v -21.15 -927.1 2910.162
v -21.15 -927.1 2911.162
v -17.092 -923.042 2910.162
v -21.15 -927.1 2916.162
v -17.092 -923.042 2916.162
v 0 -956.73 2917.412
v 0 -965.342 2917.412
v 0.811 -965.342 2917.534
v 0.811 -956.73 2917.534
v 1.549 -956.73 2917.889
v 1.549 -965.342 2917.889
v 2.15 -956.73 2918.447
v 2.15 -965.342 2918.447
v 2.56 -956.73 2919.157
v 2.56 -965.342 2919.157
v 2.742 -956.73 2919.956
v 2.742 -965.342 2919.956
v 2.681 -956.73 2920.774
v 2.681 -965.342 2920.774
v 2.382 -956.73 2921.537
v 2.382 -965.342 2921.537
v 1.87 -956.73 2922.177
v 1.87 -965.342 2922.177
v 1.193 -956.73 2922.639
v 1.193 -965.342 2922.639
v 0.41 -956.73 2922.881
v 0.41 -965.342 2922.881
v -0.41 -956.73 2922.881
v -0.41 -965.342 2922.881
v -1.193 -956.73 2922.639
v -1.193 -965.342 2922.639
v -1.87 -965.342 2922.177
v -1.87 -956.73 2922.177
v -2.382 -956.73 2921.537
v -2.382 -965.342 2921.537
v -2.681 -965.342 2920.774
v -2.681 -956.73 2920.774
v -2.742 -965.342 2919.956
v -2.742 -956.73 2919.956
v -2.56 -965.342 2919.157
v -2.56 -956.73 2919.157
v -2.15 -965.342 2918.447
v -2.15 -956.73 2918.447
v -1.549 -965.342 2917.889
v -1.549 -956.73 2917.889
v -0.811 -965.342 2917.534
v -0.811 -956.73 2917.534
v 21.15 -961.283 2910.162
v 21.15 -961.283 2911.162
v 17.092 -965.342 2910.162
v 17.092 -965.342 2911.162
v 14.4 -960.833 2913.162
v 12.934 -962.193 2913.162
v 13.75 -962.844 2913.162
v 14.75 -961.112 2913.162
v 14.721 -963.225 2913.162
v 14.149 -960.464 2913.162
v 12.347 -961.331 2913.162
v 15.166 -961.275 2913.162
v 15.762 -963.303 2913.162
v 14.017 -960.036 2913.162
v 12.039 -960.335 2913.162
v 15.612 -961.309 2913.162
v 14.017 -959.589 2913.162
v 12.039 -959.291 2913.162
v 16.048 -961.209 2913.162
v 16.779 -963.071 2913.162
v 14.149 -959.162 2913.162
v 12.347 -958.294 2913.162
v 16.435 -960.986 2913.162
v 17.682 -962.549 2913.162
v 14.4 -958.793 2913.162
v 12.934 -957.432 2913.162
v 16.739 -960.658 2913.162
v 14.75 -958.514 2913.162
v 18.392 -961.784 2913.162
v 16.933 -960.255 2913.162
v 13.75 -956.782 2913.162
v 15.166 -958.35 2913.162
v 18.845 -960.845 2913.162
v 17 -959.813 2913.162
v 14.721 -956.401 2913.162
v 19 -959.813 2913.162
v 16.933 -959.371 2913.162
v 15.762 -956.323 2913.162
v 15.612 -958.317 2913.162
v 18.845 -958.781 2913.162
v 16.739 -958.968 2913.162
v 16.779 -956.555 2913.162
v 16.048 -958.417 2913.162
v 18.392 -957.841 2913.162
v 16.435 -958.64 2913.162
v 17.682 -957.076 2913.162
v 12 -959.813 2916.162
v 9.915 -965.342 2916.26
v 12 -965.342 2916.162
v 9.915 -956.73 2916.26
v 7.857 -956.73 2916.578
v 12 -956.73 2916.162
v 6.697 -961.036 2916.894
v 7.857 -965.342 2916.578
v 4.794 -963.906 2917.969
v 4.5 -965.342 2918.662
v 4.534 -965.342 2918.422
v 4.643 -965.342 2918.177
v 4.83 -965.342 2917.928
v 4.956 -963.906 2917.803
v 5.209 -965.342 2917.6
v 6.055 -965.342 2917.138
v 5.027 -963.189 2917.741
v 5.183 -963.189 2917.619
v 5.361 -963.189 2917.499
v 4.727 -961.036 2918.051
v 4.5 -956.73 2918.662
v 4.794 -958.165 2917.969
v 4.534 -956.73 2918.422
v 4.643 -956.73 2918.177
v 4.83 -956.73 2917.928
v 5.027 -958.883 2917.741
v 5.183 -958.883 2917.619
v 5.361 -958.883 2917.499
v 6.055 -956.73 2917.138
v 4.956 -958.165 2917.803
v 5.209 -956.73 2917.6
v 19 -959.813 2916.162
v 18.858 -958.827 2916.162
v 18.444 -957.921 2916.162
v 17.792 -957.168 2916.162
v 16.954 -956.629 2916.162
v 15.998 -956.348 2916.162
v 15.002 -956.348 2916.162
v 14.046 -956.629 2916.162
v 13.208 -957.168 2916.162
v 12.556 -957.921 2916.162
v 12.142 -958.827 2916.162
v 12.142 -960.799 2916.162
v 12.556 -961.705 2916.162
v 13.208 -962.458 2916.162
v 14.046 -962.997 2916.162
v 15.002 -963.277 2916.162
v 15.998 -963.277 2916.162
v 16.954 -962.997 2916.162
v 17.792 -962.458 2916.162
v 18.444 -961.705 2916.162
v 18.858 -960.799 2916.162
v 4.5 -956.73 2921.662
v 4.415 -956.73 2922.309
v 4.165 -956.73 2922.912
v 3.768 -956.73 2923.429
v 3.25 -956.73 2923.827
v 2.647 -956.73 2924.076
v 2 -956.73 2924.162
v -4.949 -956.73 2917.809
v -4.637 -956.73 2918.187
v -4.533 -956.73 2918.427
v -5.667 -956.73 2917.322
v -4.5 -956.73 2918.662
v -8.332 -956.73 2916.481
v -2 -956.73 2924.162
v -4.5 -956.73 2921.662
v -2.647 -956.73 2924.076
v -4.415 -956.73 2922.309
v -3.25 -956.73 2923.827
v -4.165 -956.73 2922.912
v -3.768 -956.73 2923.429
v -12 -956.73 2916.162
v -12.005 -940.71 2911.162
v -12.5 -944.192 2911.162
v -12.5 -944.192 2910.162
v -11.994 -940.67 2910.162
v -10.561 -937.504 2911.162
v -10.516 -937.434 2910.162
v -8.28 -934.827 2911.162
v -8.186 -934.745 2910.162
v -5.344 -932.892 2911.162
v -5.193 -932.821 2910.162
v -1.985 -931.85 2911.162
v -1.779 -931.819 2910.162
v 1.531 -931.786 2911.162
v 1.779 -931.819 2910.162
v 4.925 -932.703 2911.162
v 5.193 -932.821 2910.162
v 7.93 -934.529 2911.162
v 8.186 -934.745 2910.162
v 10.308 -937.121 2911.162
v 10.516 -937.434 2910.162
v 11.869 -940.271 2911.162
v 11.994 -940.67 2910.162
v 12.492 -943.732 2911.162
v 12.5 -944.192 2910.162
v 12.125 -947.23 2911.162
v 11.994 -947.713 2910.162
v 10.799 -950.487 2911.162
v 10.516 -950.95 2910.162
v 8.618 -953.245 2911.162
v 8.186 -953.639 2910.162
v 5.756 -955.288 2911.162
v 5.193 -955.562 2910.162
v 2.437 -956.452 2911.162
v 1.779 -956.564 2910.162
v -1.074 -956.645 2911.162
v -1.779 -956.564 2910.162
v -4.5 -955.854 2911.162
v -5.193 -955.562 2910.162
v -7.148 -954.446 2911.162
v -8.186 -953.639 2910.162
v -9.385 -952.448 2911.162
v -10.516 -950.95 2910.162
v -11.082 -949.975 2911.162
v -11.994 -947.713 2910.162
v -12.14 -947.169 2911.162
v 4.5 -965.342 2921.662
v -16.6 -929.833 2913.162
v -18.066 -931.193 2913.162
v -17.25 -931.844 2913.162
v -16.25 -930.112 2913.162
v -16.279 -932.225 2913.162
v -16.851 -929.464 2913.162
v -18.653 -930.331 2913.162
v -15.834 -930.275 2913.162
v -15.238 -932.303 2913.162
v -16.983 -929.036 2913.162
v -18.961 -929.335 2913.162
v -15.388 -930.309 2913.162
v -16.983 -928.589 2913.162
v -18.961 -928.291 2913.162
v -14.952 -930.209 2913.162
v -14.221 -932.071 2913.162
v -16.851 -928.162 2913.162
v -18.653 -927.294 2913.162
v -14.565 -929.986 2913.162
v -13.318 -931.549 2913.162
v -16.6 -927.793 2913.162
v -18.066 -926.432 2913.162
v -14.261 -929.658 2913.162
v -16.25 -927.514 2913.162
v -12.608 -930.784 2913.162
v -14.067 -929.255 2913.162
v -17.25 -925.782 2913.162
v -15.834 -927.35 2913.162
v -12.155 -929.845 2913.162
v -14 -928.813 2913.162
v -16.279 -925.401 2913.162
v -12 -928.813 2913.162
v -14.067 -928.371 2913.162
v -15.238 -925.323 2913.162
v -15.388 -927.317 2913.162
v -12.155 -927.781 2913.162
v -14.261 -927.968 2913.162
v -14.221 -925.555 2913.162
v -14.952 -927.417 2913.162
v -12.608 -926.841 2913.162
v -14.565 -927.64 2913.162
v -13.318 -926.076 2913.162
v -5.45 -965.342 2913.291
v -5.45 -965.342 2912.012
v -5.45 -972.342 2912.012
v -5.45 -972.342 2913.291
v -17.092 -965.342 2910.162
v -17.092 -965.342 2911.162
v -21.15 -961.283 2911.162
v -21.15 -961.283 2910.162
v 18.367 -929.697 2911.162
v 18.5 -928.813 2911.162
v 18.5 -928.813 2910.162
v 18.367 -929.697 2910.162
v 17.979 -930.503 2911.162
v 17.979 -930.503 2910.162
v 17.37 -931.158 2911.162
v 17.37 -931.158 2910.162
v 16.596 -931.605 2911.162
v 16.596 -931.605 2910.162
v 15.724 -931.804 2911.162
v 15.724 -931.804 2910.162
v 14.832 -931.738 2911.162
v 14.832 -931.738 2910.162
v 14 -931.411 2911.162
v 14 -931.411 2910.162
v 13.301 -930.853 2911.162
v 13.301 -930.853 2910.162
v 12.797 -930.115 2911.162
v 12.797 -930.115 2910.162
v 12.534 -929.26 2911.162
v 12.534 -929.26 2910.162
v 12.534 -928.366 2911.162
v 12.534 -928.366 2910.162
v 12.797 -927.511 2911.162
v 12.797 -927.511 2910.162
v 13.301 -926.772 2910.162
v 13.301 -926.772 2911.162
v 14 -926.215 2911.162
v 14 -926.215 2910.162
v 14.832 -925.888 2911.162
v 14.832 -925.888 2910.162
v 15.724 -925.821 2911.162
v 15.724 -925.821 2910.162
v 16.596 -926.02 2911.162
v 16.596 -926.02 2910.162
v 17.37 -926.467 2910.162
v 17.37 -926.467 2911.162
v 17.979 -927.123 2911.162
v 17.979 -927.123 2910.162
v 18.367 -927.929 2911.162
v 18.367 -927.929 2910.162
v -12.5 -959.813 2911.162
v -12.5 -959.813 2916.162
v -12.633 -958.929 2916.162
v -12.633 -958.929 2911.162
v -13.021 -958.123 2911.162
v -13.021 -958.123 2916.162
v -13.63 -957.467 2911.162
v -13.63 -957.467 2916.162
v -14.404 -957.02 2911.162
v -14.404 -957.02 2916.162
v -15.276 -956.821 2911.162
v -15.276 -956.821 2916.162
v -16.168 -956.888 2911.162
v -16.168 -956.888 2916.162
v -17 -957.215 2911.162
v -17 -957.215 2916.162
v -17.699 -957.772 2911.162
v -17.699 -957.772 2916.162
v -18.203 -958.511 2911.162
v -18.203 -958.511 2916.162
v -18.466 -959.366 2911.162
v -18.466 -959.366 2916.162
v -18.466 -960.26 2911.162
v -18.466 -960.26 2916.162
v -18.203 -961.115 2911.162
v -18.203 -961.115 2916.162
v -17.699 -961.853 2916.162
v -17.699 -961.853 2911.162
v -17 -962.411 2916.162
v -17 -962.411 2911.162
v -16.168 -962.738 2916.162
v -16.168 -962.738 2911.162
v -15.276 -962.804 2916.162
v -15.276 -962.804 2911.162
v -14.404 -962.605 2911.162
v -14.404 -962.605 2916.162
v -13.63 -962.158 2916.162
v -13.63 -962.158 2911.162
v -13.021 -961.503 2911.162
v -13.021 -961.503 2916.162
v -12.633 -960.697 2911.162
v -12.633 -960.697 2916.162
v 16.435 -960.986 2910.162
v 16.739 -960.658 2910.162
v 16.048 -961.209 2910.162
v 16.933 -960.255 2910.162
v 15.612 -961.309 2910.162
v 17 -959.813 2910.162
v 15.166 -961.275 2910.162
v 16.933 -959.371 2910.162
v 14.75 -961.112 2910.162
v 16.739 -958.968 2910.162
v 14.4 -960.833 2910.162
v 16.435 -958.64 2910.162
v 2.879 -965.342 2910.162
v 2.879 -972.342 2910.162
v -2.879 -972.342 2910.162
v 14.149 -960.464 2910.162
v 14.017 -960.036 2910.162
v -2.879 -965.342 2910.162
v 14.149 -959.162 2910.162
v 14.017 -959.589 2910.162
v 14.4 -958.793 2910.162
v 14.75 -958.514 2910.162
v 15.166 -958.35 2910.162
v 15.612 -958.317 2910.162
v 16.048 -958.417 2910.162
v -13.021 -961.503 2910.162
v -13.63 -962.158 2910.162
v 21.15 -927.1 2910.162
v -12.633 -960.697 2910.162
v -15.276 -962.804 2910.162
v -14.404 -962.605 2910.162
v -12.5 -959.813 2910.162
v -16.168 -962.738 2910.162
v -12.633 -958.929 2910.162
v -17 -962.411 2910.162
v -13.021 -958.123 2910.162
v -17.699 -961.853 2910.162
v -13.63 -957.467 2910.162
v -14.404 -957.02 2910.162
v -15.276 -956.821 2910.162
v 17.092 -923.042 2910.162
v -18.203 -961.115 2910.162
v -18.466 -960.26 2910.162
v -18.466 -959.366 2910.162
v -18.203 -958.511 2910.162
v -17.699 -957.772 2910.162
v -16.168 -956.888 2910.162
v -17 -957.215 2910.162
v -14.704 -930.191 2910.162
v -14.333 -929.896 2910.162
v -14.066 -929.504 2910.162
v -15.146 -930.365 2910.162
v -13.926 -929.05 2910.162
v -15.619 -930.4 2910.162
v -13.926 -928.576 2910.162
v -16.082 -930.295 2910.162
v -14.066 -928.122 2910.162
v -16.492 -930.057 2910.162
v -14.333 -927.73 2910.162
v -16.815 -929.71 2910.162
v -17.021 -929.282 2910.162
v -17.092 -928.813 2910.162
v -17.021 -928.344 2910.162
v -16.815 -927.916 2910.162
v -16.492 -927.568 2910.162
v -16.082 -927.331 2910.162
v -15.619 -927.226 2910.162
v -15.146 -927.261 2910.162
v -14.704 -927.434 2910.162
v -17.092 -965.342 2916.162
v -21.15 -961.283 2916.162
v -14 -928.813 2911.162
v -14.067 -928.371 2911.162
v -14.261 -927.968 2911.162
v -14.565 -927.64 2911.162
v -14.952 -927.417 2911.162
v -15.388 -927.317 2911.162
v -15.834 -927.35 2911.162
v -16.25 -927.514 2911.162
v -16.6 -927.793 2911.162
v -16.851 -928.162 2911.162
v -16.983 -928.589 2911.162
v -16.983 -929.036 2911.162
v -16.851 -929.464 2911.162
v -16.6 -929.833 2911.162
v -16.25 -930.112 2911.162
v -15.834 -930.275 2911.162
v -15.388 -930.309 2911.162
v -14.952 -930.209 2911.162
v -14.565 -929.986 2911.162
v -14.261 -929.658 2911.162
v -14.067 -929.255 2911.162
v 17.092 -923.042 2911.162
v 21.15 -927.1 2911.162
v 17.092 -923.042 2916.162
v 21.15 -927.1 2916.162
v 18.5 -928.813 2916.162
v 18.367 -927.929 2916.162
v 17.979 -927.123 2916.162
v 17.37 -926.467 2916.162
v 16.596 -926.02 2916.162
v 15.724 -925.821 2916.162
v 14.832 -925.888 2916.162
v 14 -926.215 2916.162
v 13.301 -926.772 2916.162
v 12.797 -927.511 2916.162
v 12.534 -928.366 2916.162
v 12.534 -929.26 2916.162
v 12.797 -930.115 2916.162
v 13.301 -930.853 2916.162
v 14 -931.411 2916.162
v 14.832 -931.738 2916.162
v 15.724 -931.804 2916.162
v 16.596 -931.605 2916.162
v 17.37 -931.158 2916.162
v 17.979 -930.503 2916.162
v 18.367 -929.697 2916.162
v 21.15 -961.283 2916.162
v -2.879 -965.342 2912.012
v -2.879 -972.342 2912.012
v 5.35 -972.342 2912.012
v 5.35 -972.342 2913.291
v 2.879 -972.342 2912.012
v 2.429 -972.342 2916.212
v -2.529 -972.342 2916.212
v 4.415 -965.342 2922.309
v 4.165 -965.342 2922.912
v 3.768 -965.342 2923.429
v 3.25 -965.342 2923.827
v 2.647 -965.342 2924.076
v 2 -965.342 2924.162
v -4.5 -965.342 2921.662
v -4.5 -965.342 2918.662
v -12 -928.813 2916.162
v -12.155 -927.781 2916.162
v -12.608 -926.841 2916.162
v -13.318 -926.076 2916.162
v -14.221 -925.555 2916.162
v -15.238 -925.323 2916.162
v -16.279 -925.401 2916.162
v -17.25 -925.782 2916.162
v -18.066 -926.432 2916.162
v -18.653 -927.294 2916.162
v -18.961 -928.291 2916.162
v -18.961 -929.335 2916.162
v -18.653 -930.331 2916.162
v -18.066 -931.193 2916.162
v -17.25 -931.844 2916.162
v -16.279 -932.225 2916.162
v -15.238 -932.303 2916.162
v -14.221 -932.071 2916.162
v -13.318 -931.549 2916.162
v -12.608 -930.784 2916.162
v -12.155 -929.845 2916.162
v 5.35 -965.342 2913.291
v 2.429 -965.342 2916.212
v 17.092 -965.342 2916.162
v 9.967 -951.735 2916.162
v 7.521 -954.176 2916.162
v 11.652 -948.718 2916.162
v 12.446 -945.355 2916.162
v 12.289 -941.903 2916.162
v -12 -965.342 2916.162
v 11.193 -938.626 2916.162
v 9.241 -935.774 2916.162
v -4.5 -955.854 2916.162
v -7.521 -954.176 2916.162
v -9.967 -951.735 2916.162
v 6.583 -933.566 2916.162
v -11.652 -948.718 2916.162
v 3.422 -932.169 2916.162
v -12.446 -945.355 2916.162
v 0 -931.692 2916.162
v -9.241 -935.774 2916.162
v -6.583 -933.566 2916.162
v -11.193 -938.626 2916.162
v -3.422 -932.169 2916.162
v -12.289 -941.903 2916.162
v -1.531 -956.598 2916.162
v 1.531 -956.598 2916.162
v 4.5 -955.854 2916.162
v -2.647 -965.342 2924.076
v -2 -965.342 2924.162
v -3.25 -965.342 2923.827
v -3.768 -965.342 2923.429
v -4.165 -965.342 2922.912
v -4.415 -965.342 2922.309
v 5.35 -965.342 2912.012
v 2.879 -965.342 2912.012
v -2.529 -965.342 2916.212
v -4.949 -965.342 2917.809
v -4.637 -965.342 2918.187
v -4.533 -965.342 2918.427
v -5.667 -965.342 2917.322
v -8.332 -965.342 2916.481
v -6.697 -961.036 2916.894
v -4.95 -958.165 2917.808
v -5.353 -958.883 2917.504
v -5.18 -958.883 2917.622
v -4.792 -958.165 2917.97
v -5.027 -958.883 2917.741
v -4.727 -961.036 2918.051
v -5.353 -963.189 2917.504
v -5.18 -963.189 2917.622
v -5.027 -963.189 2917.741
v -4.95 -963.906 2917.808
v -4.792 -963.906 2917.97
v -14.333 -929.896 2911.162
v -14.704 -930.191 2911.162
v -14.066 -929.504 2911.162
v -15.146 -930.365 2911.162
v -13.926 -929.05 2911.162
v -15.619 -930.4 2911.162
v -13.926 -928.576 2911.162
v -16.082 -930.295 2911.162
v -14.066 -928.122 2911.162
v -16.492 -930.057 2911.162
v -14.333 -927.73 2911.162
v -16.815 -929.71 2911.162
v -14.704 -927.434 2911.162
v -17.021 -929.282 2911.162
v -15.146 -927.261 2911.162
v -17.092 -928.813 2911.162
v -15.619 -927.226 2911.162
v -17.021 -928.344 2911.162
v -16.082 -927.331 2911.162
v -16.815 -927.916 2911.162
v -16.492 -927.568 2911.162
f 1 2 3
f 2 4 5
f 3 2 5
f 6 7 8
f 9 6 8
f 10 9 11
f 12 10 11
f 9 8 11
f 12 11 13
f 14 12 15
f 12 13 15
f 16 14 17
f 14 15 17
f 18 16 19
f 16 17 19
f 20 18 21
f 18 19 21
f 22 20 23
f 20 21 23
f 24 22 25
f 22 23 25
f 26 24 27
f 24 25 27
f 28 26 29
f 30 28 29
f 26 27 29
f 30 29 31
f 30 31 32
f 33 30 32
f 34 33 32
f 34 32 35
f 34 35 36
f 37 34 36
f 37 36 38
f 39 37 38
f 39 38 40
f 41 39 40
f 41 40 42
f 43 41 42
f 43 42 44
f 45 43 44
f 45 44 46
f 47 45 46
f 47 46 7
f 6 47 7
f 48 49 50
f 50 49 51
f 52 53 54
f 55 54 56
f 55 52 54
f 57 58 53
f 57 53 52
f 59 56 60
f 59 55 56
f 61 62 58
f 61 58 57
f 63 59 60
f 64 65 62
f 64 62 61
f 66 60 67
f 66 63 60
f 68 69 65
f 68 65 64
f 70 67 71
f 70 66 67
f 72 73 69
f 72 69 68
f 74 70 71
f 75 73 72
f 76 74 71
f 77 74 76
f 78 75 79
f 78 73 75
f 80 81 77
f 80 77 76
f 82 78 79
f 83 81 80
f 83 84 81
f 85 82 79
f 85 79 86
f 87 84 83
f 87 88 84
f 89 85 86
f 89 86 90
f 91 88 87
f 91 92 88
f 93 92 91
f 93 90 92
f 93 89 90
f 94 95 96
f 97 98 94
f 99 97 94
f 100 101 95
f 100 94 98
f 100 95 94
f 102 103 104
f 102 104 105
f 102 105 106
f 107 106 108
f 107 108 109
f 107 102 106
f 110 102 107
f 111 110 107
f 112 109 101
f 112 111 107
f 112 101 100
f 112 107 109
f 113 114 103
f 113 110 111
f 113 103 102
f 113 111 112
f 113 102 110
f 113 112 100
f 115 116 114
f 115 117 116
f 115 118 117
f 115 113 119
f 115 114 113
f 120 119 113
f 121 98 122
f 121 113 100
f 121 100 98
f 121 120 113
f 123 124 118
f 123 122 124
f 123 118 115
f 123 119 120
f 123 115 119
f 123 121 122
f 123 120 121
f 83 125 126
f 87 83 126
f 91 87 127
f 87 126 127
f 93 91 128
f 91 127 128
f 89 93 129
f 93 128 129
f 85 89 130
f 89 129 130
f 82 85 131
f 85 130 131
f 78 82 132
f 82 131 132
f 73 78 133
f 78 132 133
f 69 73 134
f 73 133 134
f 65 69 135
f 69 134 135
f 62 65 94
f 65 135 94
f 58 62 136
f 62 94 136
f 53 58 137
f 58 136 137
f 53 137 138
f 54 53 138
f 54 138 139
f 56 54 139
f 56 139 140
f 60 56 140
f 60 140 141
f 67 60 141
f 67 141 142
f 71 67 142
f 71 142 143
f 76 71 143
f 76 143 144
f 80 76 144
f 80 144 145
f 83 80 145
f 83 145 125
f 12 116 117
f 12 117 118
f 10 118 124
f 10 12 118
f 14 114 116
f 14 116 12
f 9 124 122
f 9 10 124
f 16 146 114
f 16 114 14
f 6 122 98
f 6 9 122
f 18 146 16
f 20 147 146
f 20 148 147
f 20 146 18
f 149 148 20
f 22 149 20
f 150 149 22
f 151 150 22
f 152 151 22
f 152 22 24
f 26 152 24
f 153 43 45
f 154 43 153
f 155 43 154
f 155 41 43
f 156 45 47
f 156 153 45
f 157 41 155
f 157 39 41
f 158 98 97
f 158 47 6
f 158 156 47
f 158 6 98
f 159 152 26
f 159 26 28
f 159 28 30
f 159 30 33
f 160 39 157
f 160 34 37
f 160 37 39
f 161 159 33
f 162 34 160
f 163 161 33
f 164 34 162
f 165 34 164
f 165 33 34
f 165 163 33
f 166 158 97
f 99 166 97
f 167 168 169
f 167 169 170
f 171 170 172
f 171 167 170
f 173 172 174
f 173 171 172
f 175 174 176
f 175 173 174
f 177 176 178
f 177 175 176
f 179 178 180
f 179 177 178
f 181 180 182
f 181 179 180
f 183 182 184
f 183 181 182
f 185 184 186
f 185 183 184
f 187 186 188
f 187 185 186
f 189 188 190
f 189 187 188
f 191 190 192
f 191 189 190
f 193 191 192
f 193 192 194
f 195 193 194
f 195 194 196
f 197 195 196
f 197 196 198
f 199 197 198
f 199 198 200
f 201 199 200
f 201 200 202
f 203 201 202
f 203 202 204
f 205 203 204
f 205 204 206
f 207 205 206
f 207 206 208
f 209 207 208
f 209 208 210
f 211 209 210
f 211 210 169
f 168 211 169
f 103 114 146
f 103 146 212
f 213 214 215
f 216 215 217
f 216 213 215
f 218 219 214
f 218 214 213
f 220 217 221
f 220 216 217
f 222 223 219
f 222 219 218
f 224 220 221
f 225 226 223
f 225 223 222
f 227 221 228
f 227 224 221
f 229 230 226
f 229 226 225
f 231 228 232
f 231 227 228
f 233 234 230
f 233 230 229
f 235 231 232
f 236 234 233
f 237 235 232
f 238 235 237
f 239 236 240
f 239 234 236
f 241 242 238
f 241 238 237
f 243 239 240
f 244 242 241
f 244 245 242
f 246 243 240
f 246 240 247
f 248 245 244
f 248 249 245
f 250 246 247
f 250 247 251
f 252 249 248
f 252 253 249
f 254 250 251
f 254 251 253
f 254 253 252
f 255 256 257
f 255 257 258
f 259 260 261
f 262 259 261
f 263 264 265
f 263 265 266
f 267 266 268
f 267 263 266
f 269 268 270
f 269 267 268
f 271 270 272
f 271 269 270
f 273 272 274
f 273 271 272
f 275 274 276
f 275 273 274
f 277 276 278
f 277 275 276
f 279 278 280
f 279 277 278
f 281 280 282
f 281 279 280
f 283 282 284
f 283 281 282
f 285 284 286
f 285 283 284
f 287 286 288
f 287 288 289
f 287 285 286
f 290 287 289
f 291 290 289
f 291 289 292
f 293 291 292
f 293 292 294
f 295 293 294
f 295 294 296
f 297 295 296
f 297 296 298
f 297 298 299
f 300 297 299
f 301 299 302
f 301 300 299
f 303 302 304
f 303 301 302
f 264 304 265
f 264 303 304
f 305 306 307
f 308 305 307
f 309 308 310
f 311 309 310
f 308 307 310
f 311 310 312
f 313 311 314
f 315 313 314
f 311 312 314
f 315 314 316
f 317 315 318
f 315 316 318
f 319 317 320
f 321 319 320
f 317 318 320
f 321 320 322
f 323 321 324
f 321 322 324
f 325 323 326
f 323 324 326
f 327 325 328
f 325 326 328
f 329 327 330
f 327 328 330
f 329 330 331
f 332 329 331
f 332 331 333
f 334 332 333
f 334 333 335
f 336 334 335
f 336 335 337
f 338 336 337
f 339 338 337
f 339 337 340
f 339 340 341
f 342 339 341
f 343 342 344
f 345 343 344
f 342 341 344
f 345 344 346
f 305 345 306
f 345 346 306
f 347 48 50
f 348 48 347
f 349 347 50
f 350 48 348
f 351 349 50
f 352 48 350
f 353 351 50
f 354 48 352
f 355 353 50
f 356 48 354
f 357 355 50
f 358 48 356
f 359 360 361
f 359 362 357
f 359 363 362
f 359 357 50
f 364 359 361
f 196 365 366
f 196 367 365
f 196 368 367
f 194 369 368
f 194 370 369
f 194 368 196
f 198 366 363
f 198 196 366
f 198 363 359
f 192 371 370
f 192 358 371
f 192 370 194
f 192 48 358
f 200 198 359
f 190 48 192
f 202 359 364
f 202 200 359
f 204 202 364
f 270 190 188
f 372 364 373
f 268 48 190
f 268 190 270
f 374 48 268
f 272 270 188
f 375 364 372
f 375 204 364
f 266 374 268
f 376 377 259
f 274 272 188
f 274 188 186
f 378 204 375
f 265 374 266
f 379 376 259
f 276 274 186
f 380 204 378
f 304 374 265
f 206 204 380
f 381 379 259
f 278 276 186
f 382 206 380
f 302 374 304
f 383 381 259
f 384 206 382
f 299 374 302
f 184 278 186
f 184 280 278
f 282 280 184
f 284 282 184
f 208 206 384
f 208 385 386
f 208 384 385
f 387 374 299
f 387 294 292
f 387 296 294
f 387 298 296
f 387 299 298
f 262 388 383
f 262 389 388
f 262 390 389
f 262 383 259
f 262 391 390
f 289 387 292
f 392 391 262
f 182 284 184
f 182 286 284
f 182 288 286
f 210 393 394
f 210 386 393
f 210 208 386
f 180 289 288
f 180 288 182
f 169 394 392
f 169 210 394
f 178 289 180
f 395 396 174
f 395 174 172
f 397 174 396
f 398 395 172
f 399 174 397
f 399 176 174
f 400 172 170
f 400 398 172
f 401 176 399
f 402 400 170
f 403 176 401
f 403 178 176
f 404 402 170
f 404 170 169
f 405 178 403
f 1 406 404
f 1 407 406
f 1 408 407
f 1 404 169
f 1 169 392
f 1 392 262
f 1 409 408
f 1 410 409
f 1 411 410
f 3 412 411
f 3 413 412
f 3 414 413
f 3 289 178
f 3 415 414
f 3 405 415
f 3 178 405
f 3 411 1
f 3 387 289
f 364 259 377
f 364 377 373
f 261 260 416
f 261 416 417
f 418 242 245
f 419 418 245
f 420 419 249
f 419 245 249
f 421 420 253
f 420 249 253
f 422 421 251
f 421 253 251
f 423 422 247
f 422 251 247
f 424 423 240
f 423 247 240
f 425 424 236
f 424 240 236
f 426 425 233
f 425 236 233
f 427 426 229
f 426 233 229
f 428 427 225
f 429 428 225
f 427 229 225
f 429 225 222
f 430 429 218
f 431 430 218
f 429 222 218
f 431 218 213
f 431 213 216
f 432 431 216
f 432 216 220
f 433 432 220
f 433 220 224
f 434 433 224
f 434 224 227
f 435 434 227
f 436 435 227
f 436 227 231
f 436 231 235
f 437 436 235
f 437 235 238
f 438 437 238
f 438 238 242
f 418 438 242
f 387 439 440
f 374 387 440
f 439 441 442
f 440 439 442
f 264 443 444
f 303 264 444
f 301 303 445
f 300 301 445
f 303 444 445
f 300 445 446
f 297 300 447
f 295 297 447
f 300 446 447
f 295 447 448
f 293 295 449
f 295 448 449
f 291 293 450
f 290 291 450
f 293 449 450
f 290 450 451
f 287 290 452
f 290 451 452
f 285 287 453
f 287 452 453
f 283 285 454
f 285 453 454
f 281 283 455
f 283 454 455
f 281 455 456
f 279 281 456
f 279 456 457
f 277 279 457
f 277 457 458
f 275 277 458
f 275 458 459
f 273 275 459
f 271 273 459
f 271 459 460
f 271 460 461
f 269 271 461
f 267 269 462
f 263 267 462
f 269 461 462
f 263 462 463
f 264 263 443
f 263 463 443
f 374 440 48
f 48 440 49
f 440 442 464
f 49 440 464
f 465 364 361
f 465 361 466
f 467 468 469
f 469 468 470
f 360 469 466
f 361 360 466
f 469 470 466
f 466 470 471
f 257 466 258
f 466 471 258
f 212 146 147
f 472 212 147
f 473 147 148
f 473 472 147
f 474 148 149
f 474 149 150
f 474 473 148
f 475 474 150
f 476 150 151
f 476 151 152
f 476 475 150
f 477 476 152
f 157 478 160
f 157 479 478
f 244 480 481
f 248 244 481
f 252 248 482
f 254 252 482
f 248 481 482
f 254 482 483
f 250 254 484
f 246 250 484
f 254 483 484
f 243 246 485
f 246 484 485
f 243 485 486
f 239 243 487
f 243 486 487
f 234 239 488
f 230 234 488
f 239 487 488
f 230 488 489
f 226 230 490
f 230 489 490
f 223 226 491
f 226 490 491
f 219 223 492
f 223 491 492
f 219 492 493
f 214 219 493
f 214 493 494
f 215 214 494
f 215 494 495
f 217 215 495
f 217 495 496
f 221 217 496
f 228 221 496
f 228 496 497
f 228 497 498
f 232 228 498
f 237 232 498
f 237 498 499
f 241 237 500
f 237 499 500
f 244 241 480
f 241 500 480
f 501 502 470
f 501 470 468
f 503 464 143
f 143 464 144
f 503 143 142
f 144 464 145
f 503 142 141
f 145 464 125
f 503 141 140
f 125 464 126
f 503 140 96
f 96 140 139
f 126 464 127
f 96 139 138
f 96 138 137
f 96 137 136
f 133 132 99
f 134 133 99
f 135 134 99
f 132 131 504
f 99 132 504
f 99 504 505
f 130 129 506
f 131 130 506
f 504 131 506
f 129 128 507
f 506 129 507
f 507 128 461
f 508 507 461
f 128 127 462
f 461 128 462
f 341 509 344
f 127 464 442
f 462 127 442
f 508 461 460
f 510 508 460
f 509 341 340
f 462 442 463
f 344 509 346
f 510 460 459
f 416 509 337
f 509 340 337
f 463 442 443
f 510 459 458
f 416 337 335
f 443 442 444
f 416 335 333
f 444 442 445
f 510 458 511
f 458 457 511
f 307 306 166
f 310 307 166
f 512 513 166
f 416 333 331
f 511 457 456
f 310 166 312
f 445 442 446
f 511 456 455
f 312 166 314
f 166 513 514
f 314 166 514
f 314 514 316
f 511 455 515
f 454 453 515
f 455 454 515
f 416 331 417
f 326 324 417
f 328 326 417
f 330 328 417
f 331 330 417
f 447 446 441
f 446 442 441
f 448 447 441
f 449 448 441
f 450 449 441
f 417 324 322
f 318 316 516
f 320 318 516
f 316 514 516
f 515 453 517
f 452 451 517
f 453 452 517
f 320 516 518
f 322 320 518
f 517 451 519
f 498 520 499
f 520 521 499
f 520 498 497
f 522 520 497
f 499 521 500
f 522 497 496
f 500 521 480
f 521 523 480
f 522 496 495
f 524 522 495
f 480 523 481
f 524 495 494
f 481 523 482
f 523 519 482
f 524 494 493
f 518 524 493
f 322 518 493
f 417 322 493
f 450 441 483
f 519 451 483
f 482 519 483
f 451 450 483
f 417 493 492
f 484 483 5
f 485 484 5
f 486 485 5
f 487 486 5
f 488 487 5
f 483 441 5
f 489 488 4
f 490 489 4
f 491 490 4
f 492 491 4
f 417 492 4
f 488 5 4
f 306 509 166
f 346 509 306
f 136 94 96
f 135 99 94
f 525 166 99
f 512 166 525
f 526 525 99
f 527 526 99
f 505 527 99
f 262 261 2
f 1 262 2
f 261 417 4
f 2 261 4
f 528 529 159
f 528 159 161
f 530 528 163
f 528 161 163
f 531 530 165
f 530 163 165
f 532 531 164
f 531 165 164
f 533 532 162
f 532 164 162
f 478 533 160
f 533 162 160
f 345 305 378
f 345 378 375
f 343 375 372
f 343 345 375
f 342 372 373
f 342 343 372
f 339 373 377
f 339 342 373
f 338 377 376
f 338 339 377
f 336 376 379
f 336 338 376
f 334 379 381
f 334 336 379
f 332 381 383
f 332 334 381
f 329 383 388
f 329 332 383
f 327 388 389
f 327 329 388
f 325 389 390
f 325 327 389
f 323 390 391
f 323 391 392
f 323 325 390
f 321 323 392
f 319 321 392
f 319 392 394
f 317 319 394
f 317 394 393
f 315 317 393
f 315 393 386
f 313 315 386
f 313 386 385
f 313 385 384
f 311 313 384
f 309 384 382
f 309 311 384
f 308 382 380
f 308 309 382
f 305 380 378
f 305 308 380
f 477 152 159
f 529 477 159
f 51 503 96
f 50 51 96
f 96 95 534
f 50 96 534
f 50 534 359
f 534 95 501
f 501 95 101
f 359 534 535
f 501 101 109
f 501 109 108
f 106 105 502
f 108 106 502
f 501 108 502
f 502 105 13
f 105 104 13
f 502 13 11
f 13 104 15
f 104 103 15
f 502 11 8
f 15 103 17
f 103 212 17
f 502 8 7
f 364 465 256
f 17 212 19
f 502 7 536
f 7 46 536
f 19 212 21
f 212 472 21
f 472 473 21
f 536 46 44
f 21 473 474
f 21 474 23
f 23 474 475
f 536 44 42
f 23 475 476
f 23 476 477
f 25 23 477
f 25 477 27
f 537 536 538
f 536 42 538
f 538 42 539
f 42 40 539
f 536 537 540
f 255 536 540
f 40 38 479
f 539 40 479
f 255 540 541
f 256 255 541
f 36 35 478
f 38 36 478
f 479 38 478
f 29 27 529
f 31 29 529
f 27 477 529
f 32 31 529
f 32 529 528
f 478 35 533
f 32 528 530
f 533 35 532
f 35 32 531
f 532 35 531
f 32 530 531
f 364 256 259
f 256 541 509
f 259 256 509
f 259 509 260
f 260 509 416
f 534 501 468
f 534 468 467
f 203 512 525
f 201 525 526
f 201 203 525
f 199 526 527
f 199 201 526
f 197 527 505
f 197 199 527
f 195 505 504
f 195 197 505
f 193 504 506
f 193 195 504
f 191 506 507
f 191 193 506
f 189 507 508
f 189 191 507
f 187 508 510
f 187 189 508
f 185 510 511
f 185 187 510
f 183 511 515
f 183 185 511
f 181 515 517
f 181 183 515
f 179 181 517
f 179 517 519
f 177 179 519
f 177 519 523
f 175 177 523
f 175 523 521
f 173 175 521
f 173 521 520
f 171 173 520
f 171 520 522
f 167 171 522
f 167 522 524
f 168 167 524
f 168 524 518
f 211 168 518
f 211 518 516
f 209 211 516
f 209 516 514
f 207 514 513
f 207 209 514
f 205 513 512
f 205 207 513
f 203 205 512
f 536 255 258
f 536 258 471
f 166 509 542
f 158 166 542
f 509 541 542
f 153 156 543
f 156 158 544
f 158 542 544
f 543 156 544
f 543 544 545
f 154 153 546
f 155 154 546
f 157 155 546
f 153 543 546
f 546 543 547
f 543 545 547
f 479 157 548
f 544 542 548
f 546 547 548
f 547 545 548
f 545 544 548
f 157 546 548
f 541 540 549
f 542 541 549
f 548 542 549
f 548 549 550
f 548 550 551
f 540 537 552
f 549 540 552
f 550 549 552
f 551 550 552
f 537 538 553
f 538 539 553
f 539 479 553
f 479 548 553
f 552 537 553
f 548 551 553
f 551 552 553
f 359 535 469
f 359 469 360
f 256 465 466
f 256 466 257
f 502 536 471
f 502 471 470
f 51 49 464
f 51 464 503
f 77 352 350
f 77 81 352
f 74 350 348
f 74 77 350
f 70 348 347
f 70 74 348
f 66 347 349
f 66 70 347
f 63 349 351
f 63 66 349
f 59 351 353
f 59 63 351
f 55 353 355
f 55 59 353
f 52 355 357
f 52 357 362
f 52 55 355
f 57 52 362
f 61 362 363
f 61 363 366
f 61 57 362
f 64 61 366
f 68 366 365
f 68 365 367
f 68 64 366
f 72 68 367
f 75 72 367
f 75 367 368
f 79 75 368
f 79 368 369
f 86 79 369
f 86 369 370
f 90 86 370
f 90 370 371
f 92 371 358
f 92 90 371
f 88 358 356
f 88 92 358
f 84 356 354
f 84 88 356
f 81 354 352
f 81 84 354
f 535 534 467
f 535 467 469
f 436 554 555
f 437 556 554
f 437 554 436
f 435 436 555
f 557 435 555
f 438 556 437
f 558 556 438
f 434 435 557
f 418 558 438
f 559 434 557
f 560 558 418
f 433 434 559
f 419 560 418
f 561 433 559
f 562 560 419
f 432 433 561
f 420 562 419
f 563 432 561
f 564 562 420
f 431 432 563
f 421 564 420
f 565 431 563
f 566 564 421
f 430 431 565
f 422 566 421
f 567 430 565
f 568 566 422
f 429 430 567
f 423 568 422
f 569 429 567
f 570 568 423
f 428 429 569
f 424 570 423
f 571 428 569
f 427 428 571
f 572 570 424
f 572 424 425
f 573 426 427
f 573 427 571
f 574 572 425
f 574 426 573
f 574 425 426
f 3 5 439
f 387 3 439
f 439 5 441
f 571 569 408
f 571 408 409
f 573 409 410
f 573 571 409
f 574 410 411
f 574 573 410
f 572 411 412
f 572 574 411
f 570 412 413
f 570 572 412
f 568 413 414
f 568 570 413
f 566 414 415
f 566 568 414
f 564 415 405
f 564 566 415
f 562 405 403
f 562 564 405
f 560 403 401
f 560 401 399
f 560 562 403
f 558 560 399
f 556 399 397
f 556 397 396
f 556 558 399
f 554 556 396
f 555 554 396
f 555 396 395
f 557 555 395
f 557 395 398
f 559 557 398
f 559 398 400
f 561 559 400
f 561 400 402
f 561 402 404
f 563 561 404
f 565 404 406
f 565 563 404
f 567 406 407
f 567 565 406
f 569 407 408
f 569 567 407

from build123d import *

# Parameters (mm, degrees)
SKETCH1_R                    = 11025
BOSS_EXTRUDE1_DEPTH          = 5000
BOSS_EXTRUDE2_DEPTH          = 8000
SKETCH4_R                    = 3000
CUT_EXTRUDE2_DEPTH           = 3000
SKETCH5_R                    = 1500
CUT_EXTRUDE3_DEPTH           = 3000
SKETCH6_R                    = 3000
CUT_EXTRUDE4_DEPTH           = 3000
SKETCH3_R                    = 2900
CUT_EXTRUDE1_DEPTH           = 12018
SCALE6_SCALE                 = 0.001
CORTAR_EXTRUIR1_DEPTH        = 10
CORTAR_EXTRUIR1_DEPTH_BACK   = 10
CROQUIS1_R                   = 12.5
CROQUIS2_W                   = 9
CROQUIS2_H                   = 0.876479878
CORTAR_EXTRUIR2_DEPTH        = 8
CROQUIS4_R                   = 2.9
CROQUIS4_R_2                 = 2.4
SALIENTE_EXTRUIR2_DEPTH      = 8.611616332
CROQUIS5_R                   = 3.5
CORTAR_EXTRUIR3_DEPTH        = 3
CROQUIS6_R                   = 1.591781054
CROQUIS6_R_2                 = 3
CROQUIS6_R_3                 = 1.5
CROQUIS6_R_4                 = 12.5
SALIENTE_EXTRUIR3_DEPTH      = 1
REDONDEO1_R                  = 2.5
TALADRO_DE_MARGEN_PARA_M51_D = 5.5
SALIENTE_EXTRUIR4_DEPTH      = 7
REDONDEO2_SIZE               = 2.5
REDONDEO2_SIZE_2             = 7.5


with BuildPart() as part:
    # Sketch1 → Boss-Extrude1 (new body)
    with BuildSketch(Plane.XY):
        Polygon((-21150, 17212.99935917), (-17091.781053823, 21271.218305346), (17091.781053823, 21271.218305346), (21150, 17212.99935917), (21150, -16970.562748477), (17091.781053823, -21028.781694654), (-17091.781053823, -21028.781694654), (-21150, -16970.562748477), align=None)
        with Locations((0, 121.218305346)):
            Circle(SKETCH1_R, mode=Mode.SUBTRACT)
    extrude(amount=BOSS_EXTRUDE1_DEPTH)

    # Sketch2 → Boss-Extrude2 (add)
    with BuildSketch(Plane.XY.offset(5000)):
        Polygon((0, -11028.781694654), (4500, -11028.781694654), (4500, -21028.781694654), (-4500, -21028.781694654), (-4500, -11028.781694654), align=None)
    extrude(amount=BOSS_EXTRUDE2_DEPTH)

    # Sketch4 → Cut-Extrude2 (cut)
    with BuildSketch(Plane.XY.offset(5000)):
        with Locations((-15500, 15500)):
            Circle(SKETCH4_R)
        with Locations((15500, 15500)):
            Circle(SKETCH4_R)
        with Locations((15500, -15500)):
            Circle(SKETCH4_R)
        with Locations((-15500, -15500)):
            Circle(SKETCH4_R)
    extrude(amount=-CUT_EXTRUDE2_DEPTH, mode=Mode.SUBTRACT)

    # Sketch5 → Cut-Extrude3 (cut)
    with BuildSketch(Plane.XY.offset(2000)):
        with Locations((-15500, 15500)):
            Circle(SKETCH5_R)
        with Locations((15500, -15500)):
            Circle(SKETCH5_R)
    extrude(amount=-CUT_EXTRUDE3_DEPTH, mode=Mode.SUBTRACT)

    # Sketch6 → Cut-Extrude4 (cut)
    with BuildSketch(Plane.XY.offset(2000)):
        with Locations((15500, 15500)):
            Circle(SKETCH6_R)
        with Locations((-15500, -15500)):
            Circle(SKETCH6_R)
    extrude(amount=-CUT_EXTRUDE4_DEPTH, mode=Mode.SUBTRACT)

    # Sketch3 → Cut-Extrude1 (cut)
    with BuildSketch(Plane.XZ.offset(21028.781694654)):
        with Locations(Location((0, 9000, 0), (0, 0, 270))):
            Circle(SKETCH3_R)
    extrude(amount=-CUT_EXTRUDE1_DEPTH, mode=Mode.SUBTRACT)


with BuildPart() as part_1:
    # Scale6: scaled about (0, -945.258123271, 2914.075668663)
    add(part.part.scale(SCALE6_SCALE).moved(Location((0, -944.312865148, 2911.161592994))))

    # Croquis1 → Cortar-Extruir1 (cut, two sides: drawn at the far end of the back side and taken through both)
    with BuildSketch(Plane.XY.offset(2916.161592994).offset(-CORTAR_EXTRUIR1_DEPTH_BACK)):
        with Locations(Location((0, -944.191646843, 0), (0, 0, 248.899803976))):
            Circle(CROQUIS1_R)
    extrude(amount=CORTAR_EXTRUIR1_DEPTH + CORTAR_EXTRUIR1_DEPTH_BACK, mode=Mode.SUBTRACT)

    # Croquis2 → Cortar-Extruir2 (cut)
    with BuildSketch(Plane.XY.offset(2924.161592994)):
        with Locations((0, -956.291790571)):
            Rectangle(CROQUIS2_W, CROQUIS2_H)
    extrude(amount=-CORTAR_EXTRUIR2_DEPTH, mode=Mode.SUBTRACT)

    # Croquis4 → Saliente-Extruir2 (add)
    with BuildSketch(Plane.XZ.offset(965.341646843)):
        with Locations((0, 2920.161592994)):
            Circle(CROQUIS4_R)
        with Locations(Location((0, 2920.161592994, 0), (0, 0, 270))):
            Circle(CROQUIS4_R_2, mode=Mode.SUBTRACT)
    extrude(amount=-SALIENTE_EXTRUIR2_DEPTH)

    # Croquis5 → Cortar-Extruir3 (cut)
    with BuildSketch(Plane.XY.offset(2916.161592994)):
        with Locations((-15.5, -928.812865148)):
            Circle(CROQUIS5_R)
        with Locations((15.5, -959.812865148)):
            Circle(CROQUIS5_R)
    extrude(amount=-CORTAR_EXTRUIR3_DEPTH, mode=Mode.SUBTRACT)

    # Croquis6 → Saliente-Extruir3 (add)
    with BuildSketch(Plane(origin=(0, 0, 2911.161592994), x_dir=(-1, 0, 0), z_dir=(0, 0, -1))):
        Polygon((17.091781054, -923.041646843), (-17.091781054, -923.041646843), (-21.15, -927.099865789), (-21.15, -961.283427896), (-17.091781054, -965.341646843), (17.091781054, -965.341646843), (21.15, -961.283427896), (21.15, -927.099865789), align=None)
        with Locations((15.5, -928.812865148)):
            Circle(CROQUIS6_R, mode=Mode.SUBTRACT)
        with Locations(Location((-15.5, -928.812865148, 0), (0, 0, 180))):
            Circle(CROQUIS6_R_2, mode=Mode.SUBTRACT)
        with Locations(Location((-15.5, -959.812865148, 0), (0, 0, 180))):
            Circle(CROQUIS6_R_3, mode=Mode.SUBTRACT)
        with Locations(Location((15.5, -959.812865148, 0), (0, 0, 180))):
            Circle(CROQUIS6_R_2, mode=Mode.SUBTRACT)
        with Locations((0, -944.191646843)):
            Circle(CROQUIS6_R_4, mode=Mode.SUBTRACT)
    extrude(amount=SALIENTE_EXTRUIR3_DEPTH)

    # Redondeo1
    redondeo1_edges = [part_1.edges().sort_by_distance(p)[0] for p in [
        (4.5, -961.035838676, 2924.161592994),
        (-4.5, -961.035838676, 2924.161592994),
    ]]
    fillet(redondeo1_edges, radius=REDONDEO1_R)

    # Taladro de margen para M51 (through all)
    with Locations(Plane(origin=(0, -956.73003051, 2920.161592994), x_dir=(0, 0, 1), z_dir=(0, 1, 0))):
        with Locations((0, 0)):
            Hole(TALADRO_DE_MARGEN_PARA_M51_D / 2)

    # Croquis8 → Saliente-Extruir4 (add)
    with BuildSketch(Plane.XZ.offset(965.341646843)):
        Polygon((-2.879289322, 2912.011592994), (-5.45, 2912.011592994), (-5.45, 2913.290882316), (-2.529289322, 2916.211592994), (2.429289322, 2916.211592994), (5.35, 2913.290882316), (5.35, 2912.011592994), (2.879289322, 2912.011592994), (2.879289322, 2910.161592994), (-2.879289322, 2910.161592994), align=None)
    extrude(amount=SALIENTE_EXTRUIR4_DEPTH)

    # Redondeo2
    # an asymmetric fillet: 7.5, 2.5 mm, written as the material it adds along each edge
    with BuildSketch(Plane(origin=(4.5, -956.73003051, 2916.161592994), x_dir=(0, 0, 1), z_dir=(0, -1, 0))) as redondeo2_piece_1:
        with BuildLine():
            Bezier((REDONDEO2_SIZE, 0), (0, 0), (0, -REDONDEO2_SIZE_2), weights=[1, 0.707106781, 1])
            Line((0, -REDONDEO2_SIZE_2), (0, 0))
            Line((0, 0), (REDONDEO2_SIZE, 0))
        make_face()
    extrude(amount=8.611616332)
    with BuildSketch(Plane(origin=(-4.5, -965.341646842, 2916.161592994), x_dir=(-1, 0, 0), z_dir=(0, 1, 0))) as redondeo2_piece_2:
        with BuildLine():
            Bezier((REDONDEO2_SIZE_2, 0), (0, 0), (0, REDONDEO2_SIZE), weights=[1, 0.707106781, 1])
            Line((0, REDONDEO2_SIZE), (0, 0))
            Line((0, 0), (REDONDEO2_SIZE_2, 0))
        make_face()
    extrude(amount=8.611616332)


solid = part_1.part
